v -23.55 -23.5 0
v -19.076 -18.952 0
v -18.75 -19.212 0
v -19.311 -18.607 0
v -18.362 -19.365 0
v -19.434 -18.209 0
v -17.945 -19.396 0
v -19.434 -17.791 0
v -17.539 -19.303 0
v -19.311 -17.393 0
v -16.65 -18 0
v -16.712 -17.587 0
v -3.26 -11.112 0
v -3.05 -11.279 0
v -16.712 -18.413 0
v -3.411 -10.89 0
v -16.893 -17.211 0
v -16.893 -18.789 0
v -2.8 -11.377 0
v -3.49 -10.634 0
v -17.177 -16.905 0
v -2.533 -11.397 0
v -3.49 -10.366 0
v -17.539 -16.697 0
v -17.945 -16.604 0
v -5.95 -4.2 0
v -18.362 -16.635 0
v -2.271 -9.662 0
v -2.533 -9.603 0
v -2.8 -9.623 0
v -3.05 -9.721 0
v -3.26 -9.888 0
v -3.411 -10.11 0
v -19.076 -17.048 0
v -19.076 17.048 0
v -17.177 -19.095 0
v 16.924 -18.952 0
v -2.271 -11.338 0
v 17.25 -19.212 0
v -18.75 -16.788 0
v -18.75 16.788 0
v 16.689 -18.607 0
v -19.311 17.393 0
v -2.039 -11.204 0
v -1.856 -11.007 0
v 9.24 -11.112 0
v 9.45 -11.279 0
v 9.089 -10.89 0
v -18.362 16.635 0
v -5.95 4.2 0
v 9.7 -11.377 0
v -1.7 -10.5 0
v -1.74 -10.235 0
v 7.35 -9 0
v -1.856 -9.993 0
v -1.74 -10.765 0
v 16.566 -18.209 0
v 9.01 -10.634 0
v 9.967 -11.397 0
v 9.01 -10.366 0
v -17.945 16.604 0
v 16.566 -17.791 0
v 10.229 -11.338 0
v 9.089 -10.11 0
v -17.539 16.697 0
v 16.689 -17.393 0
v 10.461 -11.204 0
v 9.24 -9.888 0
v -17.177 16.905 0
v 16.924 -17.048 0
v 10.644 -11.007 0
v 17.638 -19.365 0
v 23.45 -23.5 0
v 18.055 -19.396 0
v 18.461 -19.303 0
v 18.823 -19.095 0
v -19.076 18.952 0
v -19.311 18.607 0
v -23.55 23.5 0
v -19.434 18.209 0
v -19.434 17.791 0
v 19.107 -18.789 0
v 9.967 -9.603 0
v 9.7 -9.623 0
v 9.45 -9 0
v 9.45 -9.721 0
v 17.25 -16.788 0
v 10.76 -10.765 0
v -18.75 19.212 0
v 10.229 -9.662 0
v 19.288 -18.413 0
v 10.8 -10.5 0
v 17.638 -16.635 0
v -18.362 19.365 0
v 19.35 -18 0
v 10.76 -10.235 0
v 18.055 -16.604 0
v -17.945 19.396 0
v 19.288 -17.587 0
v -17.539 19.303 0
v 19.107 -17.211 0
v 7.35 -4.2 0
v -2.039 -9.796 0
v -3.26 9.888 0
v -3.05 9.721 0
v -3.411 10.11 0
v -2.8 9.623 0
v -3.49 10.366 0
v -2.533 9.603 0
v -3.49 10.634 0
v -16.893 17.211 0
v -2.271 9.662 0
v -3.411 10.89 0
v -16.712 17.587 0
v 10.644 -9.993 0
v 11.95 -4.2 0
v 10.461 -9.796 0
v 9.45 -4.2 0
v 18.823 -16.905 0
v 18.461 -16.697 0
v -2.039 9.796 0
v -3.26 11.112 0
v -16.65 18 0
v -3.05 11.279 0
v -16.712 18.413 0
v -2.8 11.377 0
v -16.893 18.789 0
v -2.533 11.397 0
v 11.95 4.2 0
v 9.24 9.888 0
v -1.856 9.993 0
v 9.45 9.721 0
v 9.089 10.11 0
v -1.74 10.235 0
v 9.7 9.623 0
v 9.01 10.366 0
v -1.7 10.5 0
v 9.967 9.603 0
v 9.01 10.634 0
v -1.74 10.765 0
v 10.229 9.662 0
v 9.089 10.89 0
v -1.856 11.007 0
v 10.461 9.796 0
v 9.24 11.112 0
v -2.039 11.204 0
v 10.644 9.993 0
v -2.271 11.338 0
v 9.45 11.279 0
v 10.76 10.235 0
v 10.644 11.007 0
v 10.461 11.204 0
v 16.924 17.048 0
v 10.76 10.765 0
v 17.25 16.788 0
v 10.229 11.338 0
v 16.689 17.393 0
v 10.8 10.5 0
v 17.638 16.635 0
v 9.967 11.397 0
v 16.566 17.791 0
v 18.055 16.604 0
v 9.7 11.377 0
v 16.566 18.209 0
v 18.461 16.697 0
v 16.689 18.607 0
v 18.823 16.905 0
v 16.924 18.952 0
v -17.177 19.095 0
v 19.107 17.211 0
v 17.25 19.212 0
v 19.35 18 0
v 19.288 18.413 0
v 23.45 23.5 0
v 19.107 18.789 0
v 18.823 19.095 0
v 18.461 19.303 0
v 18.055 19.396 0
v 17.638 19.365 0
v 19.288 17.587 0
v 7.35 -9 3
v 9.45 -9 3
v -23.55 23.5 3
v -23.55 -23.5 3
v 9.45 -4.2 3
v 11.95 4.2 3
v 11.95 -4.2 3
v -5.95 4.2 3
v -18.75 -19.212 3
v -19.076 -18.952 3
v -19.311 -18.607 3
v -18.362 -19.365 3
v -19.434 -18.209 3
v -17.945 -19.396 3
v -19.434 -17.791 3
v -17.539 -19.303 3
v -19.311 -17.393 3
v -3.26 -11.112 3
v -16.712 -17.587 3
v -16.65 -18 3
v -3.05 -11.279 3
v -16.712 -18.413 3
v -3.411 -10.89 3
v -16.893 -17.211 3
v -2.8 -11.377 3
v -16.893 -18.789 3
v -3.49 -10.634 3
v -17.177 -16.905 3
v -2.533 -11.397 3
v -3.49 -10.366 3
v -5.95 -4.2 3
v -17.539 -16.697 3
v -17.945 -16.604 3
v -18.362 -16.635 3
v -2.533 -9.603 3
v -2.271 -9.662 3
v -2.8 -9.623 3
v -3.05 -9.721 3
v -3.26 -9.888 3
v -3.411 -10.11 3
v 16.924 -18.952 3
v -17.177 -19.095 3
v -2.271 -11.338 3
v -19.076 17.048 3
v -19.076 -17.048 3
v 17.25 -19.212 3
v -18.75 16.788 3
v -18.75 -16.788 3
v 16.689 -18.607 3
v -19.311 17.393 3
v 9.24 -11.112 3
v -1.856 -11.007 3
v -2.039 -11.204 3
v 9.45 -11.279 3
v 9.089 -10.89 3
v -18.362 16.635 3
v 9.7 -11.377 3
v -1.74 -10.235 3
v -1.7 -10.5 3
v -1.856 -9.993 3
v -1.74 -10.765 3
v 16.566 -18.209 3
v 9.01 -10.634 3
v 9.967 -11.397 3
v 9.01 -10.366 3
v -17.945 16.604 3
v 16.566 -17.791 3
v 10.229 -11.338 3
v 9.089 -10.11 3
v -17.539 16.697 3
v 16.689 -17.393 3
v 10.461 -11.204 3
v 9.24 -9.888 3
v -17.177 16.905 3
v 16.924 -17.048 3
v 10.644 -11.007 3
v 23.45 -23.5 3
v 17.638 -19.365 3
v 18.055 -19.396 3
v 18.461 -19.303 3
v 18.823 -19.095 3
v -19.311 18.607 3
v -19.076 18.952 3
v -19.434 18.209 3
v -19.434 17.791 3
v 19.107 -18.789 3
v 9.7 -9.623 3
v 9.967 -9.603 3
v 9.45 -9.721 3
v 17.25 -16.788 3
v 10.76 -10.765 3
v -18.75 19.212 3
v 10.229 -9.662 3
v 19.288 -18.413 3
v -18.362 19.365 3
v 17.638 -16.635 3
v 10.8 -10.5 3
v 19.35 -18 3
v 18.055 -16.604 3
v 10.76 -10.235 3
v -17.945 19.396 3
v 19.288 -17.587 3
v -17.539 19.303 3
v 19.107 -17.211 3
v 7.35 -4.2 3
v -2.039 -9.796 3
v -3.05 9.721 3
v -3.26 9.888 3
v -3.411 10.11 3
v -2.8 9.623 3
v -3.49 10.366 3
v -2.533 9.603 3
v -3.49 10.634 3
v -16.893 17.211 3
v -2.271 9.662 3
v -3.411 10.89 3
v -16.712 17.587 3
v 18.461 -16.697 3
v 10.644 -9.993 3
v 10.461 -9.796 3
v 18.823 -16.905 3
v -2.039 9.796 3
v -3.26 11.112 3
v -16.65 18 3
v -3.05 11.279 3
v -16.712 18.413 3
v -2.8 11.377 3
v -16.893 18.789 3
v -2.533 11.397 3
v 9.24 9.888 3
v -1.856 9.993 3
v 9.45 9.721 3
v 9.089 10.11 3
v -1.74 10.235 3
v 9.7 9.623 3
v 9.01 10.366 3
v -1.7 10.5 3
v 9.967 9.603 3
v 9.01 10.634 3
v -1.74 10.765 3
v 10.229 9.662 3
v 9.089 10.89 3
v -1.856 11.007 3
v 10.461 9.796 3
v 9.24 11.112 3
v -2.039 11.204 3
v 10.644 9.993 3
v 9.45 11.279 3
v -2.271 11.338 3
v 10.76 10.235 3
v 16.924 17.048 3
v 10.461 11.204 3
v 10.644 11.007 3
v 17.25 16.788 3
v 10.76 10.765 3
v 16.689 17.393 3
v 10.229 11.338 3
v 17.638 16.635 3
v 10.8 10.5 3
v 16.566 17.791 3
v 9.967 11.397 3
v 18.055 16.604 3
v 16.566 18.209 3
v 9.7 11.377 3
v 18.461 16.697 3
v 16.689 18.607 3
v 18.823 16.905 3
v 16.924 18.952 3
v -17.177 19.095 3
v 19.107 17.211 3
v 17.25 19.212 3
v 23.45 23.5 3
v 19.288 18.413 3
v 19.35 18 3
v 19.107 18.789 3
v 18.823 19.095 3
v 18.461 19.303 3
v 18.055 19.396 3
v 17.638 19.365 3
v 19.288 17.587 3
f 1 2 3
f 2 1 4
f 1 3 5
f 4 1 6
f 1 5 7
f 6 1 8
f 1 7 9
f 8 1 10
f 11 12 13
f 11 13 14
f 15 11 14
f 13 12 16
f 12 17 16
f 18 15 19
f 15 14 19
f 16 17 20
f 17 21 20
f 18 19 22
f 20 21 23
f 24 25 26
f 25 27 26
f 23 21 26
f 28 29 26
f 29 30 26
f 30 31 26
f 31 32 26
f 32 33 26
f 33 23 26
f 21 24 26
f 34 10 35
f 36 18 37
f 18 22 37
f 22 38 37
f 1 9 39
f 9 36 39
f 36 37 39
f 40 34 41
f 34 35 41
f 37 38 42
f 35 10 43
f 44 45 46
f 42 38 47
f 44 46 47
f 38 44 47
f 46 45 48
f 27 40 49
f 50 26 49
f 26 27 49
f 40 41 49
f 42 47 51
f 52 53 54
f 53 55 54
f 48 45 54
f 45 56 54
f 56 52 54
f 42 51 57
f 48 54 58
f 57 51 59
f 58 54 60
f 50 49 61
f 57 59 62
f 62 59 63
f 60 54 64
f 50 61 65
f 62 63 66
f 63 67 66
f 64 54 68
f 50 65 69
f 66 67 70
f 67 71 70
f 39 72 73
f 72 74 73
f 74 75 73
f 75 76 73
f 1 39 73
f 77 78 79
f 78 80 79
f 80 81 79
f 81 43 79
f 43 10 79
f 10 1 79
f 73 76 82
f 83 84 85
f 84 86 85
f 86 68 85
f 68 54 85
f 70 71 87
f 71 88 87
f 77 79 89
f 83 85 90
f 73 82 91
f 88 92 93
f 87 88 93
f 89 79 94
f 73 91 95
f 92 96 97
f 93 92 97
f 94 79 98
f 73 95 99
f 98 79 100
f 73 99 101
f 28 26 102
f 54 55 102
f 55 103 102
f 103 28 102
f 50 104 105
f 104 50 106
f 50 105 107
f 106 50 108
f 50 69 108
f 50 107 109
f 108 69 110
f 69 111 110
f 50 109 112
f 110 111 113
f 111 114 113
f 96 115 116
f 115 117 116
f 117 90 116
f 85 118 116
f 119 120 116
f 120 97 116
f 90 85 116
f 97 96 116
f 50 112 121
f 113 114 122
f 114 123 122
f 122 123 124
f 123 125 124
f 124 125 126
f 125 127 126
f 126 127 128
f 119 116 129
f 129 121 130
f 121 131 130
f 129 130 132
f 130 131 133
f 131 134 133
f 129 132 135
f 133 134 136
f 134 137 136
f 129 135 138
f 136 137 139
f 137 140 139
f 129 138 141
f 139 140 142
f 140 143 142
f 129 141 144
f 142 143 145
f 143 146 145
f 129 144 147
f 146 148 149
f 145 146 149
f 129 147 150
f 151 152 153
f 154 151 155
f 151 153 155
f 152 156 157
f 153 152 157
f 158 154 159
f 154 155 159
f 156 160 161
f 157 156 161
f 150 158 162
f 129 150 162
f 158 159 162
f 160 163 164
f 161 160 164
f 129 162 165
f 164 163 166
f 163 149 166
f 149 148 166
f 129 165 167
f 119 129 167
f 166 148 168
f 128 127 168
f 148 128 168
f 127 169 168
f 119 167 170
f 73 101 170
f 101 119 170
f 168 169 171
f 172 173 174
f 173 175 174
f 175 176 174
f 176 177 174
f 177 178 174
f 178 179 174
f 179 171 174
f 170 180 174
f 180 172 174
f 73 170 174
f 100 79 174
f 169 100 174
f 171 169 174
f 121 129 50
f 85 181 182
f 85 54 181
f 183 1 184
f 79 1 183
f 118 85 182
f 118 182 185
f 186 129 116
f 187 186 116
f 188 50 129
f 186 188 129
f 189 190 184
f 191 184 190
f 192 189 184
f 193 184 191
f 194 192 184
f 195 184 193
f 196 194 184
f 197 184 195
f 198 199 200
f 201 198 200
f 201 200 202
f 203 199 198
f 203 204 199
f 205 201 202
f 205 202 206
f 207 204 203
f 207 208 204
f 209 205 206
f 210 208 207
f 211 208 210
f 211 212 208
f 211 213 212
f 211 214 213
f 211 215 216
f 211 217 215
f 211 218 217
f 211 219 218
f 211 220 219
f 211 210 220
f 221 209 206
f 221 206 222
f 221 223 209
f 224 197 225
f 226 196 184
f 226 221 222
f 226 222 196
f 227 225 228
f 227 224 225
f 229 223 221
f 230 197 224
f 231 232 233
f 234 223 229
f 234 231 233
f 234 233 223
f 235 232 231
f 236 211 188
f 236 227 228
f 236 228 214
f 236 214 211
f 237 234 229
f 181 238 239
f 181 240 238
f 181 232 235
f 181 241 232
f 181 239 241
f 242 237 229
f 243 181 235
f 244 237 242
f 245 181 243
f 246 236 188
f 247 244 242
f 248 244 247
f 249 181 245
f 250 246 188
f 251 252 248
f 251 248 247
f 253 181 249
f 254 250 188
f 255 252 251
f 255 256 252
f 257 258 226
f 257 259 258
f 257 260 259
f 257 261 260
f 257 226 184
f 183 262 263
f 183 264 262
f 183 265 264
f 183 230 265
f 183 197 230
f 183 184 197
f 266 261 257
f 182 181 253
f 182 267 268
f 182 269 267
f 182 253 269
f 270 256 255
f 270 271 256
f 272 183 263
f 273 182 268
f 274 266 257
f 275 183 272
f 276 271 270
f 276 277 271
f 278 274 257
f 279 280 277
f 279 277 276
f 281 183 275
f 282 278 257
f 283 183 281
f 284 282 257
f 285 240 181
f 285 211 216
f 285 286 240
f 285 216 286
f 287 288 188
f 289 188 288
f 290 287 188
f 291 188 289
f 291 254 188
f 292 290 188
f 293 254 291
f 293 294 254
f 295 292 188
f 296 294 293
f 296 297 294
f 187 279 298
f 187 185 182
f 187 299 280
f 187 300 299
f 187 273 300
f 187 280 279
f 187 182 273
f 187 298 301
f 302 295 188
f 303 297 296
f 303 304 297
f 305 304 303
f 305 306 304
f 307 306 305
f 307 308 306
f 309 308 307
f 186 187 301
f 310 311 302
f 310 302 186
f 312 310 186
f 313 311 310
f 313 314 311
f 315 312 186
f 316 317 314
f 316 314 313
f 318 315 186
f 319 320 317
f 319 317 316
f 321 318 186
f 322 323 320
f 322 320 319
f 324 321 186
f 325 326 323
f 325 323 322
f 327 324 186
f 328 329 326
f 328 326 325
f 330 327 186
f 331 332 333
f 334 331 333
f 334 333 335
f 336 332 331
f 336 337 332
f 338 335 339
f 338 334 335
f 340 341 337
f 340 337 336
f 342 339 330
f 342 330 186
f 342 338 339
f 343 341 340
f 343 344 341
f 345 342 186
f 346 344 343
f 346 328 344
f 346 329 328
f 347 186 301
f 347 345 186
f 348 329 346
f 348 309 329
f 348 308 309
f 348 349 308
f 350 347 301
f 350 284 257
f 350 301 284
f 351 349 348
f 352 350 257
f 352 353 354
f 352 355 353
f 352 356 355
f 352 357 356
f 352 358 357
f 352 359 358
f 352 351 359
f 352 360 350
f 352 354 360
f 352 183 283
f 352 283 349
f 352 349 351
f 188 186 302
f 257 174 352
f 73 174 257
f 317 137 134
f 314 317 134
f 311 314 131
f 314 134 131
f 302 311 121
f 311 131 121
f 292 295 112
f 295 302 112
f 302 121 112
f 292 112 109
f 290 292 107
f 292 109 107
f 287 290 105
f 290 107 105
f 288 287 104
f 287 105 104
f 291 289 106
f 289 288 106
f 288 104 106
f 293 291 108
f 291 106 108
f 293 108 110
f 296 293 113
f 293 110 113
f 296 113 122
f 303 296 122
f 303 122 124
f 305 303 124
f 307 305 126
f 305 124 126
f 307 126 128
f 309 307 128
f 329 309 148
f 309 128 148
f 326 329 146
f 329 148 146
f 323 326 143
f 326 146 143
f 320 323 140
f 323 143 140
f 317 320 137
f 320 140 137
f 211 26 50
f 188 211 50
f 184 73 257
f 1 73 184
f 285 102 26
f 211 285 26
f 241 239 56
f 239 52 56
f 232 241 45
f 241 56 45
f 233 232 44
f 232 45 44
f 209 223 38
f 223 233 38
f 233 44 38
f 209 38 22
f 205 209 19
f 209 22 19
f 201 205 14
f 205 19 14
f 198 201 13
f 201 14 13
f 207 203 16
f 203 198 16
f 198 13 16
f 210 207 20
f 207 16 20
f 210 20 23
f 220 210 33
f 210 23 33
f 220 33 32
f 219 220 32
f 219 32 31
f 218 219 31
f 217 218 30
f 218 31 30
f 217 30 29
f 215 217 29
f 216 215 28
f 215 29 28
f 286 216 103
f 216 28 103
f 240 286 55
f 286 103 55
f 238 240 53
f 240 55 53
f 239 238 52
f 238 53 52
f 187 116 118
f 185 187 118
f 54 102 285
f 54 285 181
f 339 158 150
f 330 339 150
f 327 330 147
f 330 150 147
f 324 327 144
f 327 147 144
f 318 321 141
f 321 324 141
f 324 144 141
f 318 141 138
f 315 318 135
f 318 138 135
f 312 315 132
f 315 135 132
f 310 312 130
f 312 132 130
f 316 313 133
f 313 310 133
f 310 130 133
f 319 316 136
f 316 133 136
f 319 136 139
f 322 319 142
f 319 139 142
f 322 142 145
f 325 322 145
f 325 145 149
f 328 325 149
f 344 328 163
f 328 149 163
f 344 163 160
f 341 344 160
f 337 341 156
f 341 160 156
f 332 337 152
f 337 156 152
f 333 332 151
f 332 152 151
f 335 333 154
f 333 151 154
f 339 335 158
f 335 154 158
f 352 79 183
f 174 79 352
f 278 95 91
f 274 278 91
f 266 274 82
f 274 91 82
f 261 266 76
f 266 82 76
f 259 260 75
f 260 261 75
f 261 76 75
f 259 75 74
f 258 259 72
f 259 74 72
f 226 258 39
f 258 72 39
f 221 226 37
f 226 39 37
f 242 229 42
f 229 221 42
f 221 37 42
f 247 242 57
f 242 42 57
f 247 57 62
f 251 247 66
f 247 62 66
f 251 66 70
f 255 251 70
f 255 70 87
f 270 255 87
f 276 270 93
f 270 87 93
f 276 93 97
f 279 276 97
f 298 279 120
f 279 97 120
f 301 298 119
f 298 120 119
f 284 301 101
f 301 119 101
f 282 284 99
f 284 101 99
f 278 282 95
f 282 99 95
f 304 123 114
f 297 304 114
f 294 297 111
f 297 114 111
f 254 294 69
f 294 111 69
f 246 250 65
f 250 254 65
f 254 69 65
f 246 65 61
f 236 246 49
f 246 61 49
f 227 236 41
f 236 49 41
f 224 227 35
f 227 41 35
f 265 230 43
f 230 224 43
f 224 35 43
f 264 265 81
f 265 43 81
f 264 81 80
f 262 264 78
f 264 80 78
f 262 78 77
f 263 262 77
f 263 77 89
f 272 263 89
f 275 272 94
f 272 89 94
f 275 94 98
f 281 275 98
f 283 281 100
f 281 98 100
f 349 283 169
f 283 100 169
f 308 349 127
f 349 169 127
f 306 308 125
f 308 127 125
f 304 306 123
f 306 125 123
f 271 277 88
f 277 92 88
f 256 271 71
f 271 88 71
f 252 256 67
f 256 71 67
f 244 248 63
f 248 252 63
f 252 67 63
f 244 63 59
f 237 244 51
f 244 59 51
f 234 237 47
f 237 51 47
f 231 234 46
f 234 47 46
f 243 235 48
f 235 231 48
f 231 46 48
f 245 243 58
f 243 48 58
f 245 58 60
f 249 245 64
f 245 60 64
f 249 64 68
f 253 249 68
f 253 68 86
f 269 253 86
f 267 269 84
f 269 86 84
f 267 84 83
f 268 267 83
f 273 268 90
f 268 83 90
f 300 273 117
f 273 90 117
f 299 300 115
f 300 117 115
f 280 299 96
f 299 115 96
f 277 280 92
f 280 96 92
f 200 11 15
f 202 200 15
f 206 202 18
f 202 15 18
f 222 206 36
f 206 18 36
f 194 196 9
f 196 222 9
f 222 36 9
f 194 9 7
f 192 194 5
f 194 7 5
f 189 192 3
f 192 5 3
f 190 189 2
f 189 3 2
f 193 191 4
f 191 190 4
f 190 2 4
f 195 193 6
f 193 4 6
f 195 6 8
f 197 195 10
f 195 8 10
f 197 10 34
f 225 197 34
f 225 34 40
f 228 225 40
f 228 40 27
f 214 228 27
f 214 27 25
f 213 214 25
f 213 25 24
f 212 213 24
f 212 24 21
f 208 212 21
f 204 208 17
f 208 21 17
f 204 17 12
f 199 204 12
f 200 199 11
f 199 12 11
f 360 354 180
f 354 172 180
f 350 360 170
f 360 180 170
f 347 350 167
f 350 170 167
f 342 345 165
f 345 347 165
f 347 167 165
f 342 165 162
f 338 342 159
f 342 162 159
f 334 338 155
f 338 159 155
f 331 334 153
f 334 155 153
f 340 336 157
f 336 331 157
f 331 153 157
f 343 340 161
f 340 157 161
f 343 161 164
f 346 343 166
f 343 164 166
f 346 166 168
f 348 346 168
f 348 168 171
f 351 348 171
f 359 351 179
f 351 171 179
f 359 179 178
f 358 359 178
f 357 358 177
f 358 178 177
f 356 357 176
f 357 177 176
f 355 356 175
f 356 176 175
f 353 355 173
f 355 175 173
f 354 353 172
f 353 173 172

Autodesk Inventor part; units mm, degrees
ref_plane "YZ Plane" through (0, 0, 0) normal (1, 0, 0) x (0, 1, 0)
ref_plane "XZ Plane" through (0, 0, 0) normal (0, 1, 0) x (-1, 0, 0)
ref_plane "XY Plane" through (0, 0, 0) normal (0, 0, 1) x (1, 0, 0)
sketch "Sketch1" plane through (0, 0, 0) normal (0, 0, 1) x (1, 0, 0)
  line L0 (8.35, -7) -> (8.35, -9) construction
  line L1 (8.35, -9) -> (7.35, -9) construction
  line L2 (7.35, -9) -> (7.35, -7) construction
  line L3 (7.35, -7) -> (8.35, -7) construction
  line L4 (9.45, -5.5) -> (9.45, -7.5) construction
  line L5 (9.45, -7.5) -> (8.45, -7.5) construction
  line L6 (8.45, -7.5) -> (8.45, -5.5) construction
  line L7 (8.45, -5.5) -> (9.45, -5.5) construction
  line L8 (2.45, 4.2) -> (2.45, -4.2) construction
  line L9 (2.45, -4.2) -> (-5.95, -4.2) construction
  line L10 (-5.95, -4.2) -> (-5.95, 4.2) construction
  line L11 (-5.95, 4.2) -> (2.45, 4.2) construction
  circle A0 centre (-2.6, 10.5) radius 1 construction
  circle A1 centre (9.9, 10.5) radius 1 construction
  circle A2 centre (-2.6, -10.5) radius 1 construction
  circle A3 centre (9.9, -10.5) radius 1 construction
  line L12 (11.95, 12.5) -> (-11.95, 12.5) projected
  line L13 (-11.95, 12.5) -> (-11.95, -12.5) projected
  line L14 (-11.95, -12.5) -> (11.95, -12.5) projected
  line L15 (11.95, -12.5) -> (11.95, 12.5) construction
  line L16 (5.7177, -12.5) -> (14.5315, -12.5) construction
  line L17 (11.95, -4.2) -> (9.45, -4.2)
  line L18 (-5.95, -4.2) -> (-5.95, 4.2)
  line L19 (-5.95, 4.2) -> (11.95, 4.2)
  line L20 (7.35, -4.2) -> (7.35, -9)
  line L21 (7.35, -9) -> (9.45, -9)
  line L22 (9.45, -9) -> (9.45, -4.2)
  line L23 (7.35, -4.2) -> (-5.95, -4.2)
  circle A4 centre (-2.6, -10.5) radius 0.9
  circle A5 centre (9.9, -10.5) radius 0.9
  circle A6 centre (9.9, 10.5) radius 0.9
  circle A7 centre (-2.6, 10.5) radius 0.9
  line L24 (23.45, 23.5) -> (23.45, -23.5) projected
  line L25 (-23.55, 23.5) -> (23.45, 23.5) projected
  line L26 (-23.55, 12.5) -> (-23.55, 23.5) projected
  line L27 (-23.55, 12.5) -> (-11.95, 12.5)
  line L28 (-11.95, -12.5) -> (-23.55, -12.5)
  line L29 (-23.55, -23.5) -> (-23.55, -12.5) projected
  line L30 (23.45, -23.5) -> (-23.55, -23.5) projected
  line L31 (11.95, 4.2) -> (11.95, -4.2)
  line L32 (-23.55, 12.5) -> (-23.55, -12.5)
  circle A8 centre (-18.05, 18) radius 1.4 projected
  circle A9 centre (17.95, 18) radius 1.4 projected
  circle A10 centre (17.95, -18) radius 1.4 projected
  circle A11 centre (-18.05, -18) radius 1.4 projected
  point P0 (0, 0)
  dimension "d4" = 1.8
  dimension "d5" = 1.8
  dimension "d6" = 1.8
  dimension "d7" = 1.8
extrude "Extrusion1" add sketch "Sketch1" along normal blind 3
